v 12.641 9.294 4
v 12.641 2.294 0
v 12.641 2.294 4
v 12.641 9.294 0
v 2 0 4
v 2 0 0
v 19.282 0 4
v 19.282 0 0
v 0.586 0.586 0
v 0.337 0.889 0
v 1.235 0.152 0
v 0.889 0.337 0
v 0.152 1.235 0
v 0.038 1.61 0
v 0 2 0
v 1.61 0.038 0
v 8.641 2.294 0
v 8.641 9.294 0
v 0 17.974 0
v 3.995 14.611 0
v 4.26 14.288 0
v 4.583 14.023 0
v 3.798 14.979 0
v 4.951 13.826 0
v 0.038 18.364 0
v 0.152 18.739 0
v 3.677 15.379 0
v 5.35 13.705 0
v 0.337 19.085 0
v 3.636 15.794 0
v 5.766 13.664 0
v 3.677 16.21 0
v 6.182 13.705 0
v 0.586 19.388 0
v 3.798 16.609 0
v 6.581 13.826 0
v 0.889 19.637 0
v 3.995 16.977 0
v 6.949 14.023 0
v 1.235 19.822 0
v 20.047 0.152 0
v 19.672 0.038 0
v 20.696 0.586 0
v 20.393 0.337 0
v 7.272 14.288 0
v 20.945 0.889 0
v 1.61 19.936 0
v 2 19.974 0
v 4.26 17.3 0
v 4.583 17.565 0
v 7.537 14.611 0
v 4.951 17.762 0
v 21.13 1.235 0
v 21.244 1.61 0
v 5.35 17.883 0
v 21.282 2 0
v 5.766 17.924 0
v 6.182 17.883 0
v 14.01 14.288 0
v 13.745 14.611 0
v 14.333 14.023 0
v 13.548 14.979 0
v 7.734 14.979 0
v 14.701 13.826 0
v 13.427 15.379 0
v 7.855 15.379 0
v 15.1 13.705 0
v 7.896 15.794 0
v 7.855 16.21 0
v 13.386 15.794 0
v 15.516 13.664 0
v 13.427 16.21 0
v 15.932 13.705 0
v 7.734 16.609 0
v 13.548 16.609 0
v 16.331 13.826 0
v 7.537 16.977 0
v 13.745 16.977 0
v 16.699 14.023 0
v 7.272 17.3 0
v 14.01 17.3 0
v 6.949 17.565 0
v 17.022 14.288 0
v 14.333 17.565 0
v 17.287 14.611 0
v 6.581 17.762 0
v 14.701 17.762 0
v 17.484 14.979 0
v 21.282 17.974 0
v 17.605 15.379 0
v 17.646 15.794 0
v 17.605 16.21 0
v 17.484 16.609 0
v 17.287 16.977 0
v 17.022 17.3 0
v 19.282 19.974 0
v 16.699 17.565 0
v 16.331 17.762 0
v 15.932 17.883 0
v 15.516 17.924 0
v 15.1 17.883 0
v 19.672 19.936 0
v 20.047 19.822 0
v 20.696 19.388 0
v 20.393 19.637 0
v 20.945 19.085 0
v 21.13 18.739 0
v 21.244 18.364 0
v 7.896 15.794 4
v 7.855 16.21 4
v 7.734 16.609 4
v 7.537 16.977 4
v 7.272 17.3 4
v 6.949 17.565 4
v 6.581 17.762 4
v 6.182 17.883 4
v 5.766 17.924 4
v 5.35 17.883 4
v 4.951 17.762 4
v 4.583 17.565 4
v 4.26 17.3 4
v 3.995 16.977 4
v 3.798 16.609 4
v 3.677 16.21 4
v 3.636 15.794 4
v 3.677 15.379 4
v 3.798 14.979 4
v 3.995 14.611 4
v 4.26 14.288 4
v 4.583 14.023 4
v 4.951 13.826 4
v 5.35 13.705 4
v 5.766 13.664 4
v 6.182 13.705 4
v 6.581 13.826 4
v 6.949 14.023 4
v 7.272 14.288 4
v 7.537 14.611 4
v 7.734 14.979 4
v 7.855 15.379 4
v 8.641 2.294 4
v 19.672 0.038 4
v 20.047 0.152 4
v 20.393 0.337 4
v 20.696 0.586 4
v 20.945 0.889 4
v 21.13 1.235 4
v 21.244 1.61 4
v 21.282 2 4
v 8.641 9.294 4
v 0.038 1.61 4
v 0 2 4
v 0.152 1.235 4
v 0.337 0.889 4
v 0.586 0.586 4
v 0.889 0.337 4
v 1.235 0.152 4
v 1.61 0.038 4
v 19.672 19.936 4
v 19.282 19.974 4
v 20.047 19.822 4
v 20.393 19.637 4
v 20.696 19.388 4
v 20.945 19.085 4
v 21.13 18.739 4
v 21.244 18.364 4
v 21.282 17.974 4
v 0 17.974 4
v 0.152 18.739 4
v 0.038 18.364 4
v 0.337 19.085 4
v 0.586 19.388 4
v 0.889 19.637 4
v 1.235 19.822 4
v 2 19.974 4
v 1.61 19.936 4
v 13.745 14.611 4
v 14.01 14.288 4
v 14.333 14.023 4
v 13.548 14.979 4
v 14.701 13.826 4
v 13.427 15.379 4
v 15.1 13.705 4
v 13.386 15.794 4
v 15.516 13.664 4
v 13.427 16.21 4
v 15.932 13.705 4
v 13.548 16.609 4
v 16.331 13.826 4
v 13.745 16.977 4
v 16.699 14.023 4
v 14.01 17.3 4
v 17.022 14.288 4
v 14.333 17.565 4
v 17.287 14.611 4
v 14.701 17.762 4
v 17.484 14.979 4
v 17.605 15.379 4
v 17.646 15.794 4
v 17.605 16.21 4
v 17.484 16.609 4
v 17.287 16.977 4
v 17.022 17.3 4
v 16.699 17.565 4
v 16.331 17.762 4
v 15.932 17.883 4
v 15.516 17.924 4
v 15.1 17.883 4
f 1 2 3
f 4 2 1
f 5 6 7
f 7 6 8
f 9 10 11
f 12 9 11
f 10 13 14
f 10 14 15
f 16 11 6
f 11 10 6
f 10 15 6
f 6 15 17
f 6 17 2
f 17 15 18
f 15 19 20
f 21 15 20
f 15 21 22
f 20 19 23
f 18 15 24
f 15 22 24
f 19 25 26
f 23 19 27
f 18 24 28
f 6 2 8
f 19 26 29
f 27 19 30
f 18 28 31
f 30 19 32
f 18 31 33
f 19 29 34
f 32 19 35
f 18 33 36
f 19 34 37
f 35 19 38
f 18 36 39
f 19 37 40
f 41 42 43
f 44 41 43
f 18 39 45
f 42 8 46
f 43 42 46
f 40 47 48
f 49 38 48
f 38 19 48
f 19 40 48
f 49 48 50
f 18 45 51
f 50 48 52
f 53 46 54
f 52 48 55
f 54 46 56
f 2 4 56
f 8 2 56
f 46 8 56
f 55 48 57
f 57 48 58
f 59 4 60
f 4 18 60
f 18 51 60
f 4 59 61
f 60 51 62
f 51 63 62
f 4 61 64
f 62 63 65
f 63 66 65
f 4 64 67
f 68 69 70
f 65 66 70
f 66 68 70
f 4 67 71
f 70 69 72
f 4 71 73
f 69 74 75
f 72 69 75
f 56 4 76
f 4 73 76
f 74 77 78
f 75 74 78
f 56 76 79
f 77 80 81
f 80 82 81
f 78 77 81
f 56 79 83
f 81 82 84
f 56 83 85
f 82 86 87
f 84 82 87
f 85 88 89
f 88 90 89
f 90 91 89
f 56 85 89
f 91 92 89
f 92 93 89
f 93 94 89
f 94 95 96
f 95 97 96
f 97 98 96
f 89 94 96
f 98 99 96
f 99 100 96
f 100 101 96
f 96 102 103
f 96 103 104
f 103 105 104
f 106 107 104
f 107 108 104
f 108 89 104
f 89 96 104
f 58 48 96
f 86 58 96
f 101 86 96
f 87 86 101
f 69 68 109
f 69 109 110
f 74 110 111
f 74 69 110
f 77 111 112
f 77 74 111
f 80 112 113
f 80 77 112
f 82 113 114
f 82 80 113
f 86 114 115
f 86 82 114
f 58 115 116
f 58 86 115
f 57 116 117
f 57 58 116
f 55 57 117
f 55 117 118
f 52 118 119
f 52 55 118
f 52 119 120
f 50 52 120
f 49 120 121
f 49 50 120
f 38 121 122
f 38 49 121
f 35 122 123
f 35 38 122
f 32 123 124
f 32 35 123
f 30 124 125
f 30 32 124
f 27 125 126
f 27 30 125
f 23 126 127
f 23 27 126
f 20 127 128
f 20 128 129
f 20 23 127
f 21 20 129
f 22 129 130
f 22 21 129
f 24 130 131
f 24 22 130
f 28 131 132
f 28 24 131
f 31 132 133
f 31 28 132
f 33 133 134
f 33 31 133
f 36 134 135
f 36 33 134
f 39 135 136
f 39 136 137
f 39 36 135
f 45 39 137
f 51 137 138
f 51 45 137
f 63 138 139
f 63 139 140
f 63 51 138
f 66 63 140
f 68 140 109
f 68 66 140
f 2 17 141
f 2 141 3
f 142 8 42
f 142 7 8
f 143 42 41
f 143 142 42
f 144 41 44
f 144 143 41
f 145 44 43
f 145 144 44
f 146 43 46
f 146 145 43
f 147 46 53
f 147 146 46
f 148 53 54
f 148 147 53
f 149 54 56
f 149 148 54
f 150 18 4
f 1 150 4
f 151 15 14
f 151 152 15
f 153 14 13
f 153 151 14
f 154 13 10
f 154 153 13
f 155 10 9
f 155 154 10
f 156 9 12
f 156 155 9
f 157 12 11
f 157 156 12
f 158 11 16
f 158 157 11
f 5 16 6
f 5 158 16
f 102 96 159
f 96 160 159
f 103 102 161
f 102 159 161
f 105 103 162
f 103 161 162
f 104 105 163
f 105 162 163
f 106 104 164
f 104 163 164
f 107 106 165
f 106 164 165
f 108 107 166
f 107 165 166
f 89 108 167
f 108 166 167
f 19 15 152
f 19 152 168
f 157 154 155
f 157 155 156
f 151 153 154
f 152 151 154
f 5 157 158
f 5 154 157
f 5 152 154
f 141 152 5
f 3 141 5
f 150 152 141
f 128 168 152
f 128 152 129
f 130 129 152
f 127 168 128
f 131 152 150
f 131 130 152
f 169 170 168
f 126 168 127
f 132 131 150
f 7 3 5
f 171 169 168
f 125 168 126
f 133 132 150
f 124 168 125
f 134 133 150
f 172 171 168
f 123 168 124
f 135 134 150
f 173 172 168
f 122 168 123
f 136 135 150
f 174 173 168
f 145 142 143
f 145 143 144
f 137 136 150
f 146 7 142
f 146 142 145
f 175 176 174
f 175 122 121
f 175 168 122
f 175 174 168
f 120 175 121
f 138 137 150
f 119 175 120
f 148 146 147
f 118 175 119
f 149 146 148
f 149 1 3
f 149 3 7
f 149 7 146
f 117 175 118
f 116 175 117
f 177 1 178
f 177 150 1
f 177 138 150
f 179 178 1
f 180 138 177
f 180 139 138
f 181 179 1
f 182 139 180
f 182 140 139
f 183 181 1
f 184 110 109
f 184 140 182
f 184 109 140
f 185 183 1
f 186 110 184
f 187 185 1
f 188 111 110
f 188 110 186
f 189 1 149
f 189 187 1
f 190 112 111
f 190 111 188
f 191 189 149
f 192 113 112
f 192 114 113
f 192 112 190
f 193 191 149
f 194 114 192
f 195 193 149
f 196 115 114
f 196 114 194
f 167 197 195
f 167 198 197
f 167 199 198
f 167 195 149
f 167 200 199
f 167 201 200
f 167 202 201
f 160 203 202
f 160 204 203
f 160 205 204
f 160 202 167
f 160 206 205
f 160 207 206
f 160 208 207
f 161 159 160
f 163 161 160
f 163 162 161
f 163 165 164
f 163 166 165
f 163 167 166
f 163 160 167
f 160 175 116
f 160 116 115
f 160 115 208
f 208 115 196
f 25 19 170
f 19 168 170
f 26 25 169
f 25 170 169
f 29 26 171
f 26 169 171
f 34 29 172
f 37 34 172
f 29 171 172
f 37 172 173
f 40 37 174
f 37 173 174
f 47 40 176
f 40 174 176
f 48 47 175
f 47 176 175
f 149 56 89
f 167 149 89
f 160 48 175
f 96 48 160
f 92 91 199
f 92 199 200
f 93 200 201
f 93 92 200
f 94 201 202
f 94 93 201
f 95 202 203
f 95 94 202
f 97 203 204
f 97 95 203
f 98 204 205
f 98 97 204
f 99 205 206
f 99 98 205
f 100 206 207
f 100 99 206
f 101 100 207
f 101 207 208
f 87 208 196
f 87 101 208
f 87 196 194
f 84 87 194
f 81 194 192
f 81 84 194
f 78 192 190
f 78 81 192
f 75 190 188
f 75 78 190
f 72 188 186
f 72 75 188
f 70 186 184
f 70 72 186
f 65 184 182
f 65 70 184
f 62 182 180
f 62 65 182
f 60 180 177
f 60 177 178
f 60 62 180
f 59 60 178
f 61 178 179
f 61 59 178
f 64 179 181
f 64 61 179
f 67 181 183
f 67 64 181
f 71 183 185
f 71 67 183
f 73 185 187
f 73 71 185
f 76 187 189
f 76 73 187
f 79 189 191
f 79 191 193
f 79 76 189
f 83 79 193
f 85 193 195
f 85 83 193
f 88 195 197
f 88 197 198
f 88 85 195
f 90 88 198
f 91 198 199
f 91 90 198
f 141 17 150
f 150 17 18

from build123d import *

# Parameters (mm, degrees)
ESQUISSE1_W        = 21.281999849
ESQUISSE1_H        = 19.97412287
ESQUISSE1_R        = 2.13
ESQUISSE1_W_2      = 4
ESQUISSE1_H_2      = 7
BOSS_EXTRU_1_DEPTH = 4
CONG_1_R           = 2


with BuildPart() as part:
    # Esquisse1 → Boss.-Extru.1 (new body)
    with BuildSketch(Plane.XY):
        with Locations((10.640999925, 9.987061435)):
            Rectangle(ESQUISSE1_W, ESQUISSE1_H)
        with Locations((5.765999924, 15.79412287)):
            Circle(ESQUISSE1_R, mode=Mode.SUBTRACT)
        with Locations((15.515999924, 15.79412287)):
            Circle(ESQUISSE1_R, mode=Mode.SUBTRACT)
        with Locations((10.640999924, 5.79412287)):
            Rectangle(ESQUISSE1_W_2, ESQUISSE1_H_2, mode=Mode.SUBTRACT)
    extrude(amount=BOSS_EXTRU_1_DEPTH)

    # Congé1
    cong_1_edges = [part.edges().sort_by_distance(p)[0] for p in [
        (0, 19.97412287, 2),
        (21.281999849, 19.97412287, 2),
        (21.281999849, 0, 2),
        (0, 0, 2),
    ]]
    fillet(cong_1_edges, radius=CONG_1_R)


solid = part.part
